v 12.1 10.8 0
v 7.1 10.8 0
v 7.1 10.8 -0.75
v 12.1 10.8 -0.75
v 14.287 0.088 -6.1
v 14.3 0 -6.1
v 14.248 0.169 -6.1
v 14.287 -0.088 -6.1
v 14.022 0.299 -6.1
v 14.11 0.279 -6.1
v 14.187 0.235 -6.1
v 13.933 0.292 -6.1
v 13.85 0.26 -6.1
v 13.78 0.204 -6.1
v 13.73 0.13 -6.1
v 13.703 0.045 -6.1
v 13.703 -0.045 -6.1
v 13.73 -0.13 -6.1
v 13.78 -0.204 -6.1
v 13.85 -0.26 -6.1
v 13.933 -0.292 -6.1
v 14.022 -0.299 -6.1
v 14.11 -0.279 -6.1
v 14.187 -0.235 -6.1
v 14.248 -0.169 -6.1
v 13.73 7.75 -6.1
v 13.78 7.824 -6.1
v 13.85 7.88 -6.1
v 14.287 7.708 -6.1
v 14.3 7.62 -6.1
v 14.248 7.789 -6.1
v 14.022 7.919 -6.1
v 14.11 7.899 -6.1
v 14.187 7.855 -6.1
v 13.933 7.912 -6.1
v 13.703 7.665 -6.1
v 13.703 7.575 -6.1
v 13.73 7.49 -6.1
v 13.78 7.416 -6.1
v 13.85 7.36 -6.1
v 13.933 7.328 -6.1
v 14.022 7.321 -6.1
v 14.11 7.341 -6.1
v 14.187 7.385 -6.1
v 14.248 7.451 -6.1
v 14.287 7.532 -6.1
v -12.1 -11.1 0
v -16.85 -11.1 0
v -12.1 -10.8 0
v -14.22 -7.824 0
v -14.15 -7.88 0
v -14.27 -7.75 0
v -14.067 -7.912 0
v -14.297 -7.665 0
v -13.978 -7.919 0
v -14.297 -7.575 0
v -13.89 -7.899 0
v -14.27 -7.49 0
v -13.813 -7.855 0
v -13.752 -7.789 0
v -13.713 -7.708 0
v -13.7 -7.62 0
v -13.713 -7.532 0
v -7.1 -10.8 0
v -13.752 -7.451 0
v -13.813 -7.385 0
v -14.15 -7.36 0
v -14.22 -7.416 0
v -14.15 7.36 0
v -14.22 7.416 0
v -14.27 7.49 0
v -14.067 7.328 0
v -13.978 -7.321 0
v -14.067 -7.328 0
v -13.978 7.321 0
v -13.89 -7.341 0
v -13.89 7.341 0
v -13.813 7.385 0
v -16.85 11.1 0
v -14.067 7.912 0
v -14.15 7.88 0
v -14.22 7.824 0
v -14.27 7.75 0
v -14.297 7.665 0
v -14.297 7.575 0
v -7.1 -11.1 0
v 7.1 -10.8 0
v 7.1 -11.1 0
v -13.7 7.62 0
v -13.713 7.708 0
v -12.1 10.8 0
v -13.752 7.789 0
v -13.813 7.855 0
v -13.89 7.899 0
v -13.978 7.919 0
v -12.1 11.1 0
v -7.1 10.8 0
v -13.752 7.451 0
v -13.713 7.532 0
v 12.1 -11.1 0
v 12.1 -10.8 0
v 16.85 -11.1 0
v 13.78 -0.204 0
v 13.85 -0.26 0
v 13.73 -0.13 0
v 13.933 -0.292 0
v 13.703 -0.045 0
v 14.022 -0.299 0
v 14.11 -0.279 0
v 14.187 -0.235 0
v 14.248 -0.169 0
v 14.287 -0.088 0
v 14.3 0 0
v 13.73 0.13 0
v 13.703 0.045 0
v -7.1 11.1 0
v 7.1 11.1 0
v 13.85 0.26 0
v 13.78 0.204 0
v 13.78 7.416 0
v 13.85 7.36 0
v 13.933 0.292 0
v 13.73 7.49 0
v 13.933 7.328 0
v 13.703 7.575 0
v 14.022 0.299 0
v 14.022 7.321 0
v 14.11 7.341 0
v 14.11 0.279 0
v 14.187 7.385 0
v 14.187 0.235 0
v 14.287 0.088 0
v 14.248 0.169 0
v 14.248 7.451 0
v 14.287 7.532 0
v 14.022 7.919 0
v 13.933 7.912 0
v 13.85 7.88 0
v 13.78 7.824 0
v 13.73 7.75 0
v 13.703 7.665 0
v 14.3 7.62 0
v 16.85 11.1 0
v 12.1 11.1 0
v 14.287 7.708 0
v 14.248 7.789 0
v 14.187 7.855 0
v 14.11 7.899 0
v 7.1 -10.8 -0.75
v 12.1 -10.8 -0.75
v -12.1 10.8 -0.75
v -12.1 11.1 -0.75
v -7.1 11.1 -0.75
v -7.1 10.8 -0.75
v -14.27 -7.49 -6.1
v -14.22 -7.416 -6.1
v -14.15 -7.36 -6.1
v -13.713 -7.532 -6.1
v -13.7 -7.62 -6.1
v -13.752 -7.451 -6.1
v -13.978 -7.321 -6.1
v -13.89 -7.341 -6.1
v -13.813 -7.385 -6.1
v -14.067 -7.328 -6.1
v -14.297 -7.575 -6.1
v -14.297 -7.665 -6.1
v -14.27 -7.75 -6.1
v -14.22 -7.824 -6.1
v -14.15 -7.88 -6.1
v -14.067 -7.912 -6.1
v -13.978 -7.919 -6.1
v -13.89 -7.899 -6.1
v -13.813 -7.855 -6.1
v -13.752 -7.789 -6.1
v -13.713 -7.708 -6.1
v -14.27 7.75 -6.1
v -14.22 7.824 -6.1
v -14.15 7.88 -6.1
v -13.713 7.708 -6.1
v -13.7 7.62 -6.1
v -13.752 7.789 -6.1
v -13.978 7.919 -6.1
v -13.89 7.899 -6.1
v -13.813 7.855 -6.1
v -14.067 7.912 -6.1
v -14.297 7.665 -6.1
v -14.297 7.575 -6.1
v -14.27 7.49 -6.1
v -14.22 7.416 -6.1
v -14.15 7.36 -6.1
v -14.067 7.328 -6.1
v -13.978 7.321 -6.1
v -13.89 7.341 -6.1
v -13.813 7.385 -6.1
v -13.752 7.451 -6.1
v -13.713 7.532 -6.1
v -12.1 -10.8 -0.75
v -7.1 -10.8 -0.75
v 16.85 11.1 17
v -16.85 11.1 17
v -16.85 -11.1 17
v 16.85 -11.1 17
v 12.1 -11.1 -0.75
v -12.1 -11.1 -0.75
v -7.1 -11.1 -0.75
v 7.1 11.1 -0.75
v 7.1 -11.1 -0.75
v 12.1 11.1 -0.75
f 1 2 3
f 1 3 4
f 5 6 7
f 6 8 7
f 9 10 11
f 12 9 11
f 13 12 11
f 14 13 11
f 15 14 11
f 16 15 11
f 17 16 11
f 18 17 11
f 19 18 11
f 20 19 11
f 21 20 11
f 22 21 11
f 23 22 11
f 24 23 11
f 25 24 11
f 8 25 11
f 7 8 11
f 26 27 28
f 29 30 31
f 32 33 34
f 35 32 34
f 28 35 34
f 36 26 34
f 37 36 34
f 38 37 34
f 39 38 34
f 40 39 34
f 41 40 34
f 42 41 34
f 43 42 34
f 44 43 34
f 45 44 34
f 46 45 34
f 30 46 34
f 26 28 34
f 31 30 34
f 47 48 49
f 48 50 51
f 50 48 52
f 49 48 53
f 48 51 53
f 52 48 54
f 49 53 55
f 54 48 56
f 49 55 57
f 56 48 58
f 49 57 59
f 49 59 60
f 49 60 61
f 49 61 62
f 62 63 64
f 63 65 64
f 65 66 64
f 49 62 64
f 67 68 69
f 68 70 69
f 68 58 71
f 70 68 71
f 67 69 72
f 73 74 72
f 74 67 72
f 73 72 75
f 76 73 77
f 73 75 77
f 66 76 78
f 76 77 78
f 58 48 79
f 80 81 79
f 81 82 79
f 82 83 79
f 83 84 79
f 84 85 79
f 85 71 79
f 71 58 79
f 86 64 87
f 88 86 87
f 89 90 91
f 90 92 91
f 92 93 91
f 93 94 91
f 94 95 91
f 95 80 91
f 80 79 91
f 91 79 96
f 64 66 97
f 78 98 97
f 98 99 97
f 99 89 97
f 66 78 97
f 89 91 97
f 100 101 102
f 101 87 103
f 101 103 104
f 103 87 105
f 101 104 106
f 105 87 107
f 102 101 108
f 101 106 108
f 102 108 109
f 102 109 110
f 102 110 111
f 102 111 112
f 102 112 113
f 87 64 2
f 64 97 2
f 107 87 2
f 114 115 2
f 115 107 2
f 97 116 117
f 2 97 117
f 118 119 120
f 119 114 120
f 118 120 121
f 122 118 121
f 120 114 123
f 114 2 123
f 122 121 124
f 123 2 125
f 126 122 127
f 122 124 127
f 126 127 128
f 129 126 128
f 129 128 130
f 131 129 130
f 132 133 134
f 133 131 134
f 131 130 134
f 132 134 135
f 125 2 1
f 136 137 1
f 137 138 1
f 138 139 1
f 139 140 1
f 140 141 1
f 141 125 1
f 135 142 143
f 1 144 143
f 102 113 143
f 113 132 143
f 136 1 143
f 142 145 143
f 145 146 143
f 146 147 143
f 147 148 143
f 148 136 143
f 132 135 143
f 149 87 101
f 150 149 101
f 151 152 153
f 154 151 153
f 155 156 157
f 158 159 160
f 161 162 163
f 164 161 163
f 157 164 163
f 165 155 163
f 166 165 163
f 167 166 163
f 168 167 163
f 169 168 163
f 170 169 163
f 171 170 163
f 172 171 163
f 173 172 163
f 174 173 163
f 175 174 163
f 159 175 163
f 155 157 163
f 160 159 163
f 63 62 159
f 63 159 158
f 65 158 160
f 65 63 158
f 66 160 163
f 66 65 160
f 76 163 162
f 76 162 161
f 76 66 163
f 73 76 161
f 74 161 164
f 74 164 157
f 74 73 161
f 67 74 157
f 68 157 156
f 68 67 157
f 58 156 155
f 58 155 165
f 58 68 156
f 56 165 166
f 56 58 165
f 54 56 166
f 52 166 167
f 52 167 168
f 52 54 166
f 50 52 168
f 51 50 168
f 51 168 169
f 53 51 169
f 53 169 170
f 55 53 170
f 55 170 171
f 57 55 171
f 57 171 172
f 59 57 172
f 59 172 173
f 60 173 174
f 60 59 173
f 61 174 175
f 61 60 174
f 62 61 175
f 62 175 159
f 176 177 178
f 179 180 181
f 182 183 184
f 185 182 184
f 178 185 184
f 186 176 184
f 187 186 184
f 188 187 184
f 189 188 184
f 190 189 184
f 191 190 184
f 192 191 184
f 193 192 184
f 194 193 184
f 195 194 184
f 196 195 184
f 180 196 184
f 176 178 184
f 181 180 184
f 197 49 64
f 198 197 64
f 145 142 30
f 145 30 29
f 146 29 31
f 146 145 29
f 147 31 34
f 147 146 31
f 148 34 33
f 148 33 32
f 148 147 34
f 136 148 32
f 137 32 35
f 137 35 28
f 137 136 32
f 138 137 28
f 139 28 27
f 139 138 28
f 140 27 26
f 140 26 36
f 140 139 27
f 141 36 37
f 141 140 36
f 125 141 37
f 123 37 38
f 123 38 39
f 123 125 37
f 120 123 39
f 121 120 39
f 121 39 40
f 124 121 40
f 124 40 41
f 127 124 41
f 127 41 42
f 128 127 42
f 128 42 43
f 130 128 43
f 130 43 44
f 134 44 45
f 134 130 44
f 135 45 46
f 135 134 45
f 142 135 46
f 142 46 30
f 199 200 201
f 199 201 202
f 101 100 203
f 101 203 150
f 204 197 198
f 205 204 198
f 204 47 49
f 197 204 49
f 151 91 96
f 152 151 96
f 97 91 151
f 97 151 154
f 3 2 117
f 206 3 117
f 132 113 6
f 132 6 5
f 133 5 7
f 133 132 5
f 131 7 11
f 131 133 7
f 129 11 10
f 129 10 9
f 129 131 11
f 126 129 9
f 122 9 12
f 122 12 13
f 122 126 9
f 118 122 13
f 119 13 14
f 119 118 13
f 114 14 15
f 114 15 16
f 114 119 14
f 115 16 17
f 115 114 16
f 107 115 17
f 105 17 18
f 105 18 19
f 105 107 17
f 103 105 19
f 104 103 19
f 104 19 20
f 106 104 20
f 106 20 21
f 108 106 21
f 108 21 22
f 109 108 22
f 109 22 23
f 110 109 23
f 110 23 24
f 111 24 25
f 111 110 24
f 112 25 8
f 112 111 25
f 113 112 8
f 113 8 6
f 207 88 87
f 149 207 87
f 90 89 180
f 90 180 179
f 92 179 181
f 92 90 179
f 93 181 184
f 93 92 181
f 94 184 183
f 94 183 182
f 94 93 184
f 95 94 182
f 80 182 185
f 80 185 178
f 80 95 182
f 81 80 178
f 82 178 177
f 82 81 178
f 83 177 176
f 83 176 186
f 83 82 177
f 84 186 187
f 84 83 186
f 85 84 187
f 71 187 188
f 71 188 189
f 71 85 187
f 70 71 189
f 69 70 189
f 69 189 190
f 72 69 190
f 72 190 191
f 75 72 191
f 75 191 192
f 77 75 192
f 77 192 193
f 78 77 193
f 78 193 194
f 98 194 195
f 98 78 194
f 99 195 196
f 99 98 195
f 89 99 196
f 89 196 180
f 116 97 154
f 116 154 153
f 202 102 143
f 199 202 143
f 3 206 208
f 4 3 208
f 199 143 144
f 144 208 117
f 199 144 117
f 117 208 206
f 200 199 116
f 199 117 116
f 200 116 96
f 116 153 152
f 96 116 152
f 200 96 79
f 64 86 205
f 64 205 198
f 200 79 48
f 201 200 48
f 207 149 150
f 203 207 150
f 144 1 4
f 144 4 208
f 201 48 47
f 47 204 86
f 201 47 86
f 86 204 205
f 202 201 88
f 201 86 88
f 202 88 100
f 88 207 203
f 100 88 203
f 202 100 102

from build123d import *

# Parameters (mm, degrees)
F0_R     = 0.3
F0_W     = 5
F0_H     = 0.3
F1_DEPTH = 17
F2_DEPTH = 0.75
F3_DEPTH = 6.1


# Not quite as in the source:
# - a feature names something its author has since deleted; it is built from what else it names


with BuildPart() as f1:
    # F0 (on Top) → F1 (new body)
    with BuildSketch(Plane.XY):
        Polygon((12.1, -11.1), (16.85, -11.1), (16.85, 11.1), (12.1, 11.1), (12.1, 10.8), (7.1, 10.8), (7.1, 11.1), (-7.1, 11.1), (-7.1, 10.8), (-12.1, 10.8), (-12.1, 11.1), (-16.85, 11.1), (-16.85, -11.1), (-12.1, -11.1), (-12.1, -10.8), (-7.1, -10.8), (-7.1, -11.1), (7.1, -11.1), (7.1, -10.8), (12.1, -10.8), align=None)
        with Locations((-14, -7.62)):
            Circle(F0_R, mode=Mode.SUBTRACT)
        with Locations((-14, 7.62)):
            Circle(F0_R, mode=Mode.SUBTRACT)
        with Locations((14, 0)):
            Circle(F0_R, mode=Mode.SUBTRACT)
        with Locations((14, 7.62)):
            Circle(F0_R, mode=Mode.SUBTRACT)
        with Locations((-9.6, 10.95)):
            Rectangle(F0_W, F0_H)
        with Locations((9.6, 10.95)):
            Rectangle(F0_W, F0_H)
        with Locations((9.6, -10.95)):
            Rectangle(F0_W, F0_H)
        with Locations((-9.6, -10.95)):
            Rectangle(F0_W, F0_H)
        with Locations((-14, -7.62)):
            Circle(F0_R)
        with Locations((-14, 7.62)):
            Circle(F0_R)
        with Locations((14, 0)):
            Circle(F0_R)
        with Locations((14, 7.62)):
            Circle(F0_R)
    extrude(amount=F1_DEPTH)

    # F0 (on Top) → F2 (join)
    with BuildSketch(Plane.XY):
        with Locations((9.6, 10.95)):
            Rectangle(F0_W, F0_H)
        with Locations((-9.6, 10.95)):
            Rectangle(F0_W, F0_H)
        with Locations((-9.6, -10.95)):
            Rectangle(F0_W, F0_H)
        with Locations((9.6, -10.95)):
            Rectangle(F0_W, F0_H)
    extrude(amount=-F2_DEPTH)

    # F0 (on Top) → F3 (join)
    with BuildSketch(Plane.XY):
        with Locations((14, 0)):
            Circle(F0_R)
        with Locations((-14, 7.62)):
            Circle(F0_R)
        with Locations((-14, -7.62)):
            Circle(F0_R)
        with Locations((14, 7.62)):
            Circle(F0_R)
    extrude(amount=-F3_DEPTH)


solid = f1.part
